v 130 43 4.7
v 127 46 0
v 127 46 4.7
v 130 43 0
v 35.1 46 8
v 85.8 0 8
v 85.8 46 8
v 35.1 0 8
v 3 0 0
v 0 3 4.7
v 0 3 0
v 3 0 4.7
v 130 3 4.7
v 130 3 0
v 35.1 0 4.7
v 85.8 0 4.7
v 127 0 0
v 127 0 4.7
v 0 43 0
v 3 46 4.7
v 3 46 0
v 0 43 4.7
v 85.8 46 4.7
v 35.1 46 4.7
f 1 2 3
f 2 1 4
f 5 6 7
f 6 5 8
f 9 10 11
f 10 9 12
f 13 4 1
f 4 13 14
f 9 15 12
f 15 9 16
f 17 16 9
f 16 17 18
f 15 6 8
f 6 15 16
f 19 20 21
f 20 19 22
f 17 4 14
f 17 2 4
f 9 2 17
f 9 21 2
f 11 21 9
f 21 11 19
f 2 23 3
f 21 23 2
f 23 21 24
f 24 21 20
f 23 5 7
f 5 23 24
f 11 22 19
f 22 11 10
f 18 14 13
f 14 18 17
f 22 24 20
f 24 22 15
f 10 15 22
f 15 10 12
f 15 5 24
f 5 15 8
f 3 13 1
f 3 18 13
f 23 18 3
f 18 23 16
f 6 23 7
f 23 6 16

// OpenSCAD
$fn = 32;

// ----------------------------------------------------------------------
// Stepped bar: centerstep, 130 x 46 x 8/4.7 mm
// ----------------------------------------------------------------------

// --- parameters (mm) ---
bar_l = 130;              // bar length, X
bar_w = 46;               // bar width, Y
plate_t = 8;              // thickness of the thick zone, Z
thin_t = 4.7;             // thickness of the thin zone
corner_c = 3;             // corner chamfer of the bar
step_cut = 3.3;           // material removed from the thin zone
thick_from = 35.1;        // start of the thick middle zone
thick_to = 85.8;          // end of the thick middle zone
depth_1 = 3.3;            // depth of cut 1 from the top face
depth_2 = 3.3;            // depth of cut 2 from the top face

profile = [[3, 0], [127, 0], [130, 3], [130, 43], [127, 46], [3, 46], [0, 43], [0, 3]];  // primary outline, 8 points, counter clockwise
void_1 = [[-1, -1], [35.1, -1], [35.1, 47], [-1, 47]];  // thin left end, 4 points
void_2 = [[85.8, -1], [131, -1], [131, 47], [85.8, 47]];  // thin right end, 4 points

// --- the one profile operation ---
difference() {
  linear_extrude(height = plate_t) polygon(points = profile);
  translate([0, 0, plate_t - depth_1])
    linear_extrude(height = depth_1 + 1) polygon(points = void_1);
  translate([0, 0, plate_t - depth_2])
    linear_extrude(height = depth_2 + 1) polygon(points = void_2);
}
